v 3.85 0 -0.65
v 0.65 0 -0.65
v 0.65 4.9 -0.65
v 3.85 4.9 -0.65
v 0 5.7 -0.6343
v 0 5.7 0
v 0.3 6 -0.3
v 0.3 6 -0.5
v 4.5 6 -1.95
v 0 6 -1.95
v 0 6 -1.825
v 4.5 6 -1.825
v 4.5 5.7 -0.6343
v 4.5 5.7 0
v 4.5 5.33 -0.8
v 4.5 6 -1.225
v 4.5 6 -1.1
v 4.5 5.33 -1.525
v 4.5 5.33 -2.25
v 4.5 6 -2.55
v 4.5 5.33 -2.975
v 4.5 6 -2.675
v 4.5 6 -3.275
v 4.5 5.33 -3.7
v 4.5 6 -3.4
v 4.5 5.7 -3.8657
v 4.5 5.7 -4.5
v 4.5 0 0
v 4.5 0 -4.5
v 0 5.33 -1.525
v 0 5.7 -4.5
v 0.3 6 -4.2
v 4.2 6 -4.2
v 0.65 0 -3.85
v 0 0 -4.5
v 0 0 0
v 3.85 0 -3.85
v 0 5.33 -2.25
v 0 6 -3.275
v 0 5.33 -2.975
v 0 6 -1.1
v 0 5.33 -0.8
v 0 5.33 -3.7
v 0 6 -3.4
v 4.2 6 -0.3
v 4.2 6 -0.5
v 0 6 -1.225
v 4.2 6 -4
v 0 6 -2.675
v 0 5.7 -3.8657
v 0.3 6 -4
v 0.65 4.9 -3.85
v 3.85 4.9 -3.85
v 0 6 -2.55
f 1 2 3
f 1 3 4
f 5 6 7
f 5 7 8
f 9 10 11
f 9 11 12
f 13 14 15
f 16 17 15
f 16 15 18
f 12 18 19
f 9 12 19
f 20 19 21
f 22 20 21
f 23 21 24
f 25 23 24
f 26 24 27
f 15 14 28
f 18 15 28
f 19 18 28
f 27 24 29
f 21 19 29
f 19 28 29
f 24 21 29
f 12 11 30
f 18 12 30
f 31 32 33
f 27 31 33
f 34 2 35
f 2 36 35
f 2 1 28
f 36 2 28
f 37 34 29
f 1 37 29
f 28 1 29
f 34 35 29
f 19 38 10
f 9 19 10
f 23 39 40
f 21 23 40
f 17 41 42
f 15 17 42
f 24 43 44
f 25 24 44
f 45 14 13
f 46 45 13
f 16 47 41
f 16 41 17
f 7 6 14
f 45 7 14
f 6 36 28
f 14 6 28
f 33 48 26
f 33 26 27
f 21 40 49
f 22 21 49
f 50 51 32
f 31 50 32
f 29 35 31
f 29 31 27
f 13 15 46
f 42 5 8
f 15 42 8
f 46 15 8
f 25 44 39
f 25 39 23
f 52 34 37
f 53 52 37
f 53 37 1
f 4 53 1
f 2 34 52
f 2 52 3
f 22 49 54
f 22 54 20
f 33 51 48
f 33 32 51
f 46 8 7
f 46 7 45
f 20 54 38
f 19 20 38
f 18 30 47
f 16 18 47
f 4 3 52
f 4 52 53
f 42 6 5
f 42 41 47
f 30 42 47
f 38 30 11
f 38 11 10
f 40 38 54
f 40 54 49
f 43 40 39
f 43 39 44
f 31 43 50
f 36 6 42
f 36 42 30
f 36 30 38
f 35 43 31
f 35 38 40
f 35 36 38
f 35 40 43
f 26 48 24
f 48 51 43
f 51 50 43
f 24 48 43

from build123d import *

# Parameters (mm, degrees)
SKETCH1_W           = 4.5
SKETCH1_H           = 4.5
BOSS_EXTRUDE1_DEPTH = 6
SKETCH2_W           = 3.2
SKETCH2_H           = 3.2
CUT_EXTRUDE1_DEPTH  = 4.9
CUT_EXTRUDE2_DEPTH  = 4.5
LPATTERN1_COUNT     = 5
LPATTERN1_PITCH     = 0.725
CHAMFER1_SIZE       = 0.3


with BuildPart() as part:
    # Sketch1 → Boss-Extrude1 (new body)
    with BuildSketch(Plane(origin=(0, 0, 0), x_dir=(1, 0, 0), z_dir=(0, 1, 0))):
        with Locations((2.25, 2.25)):
            Rectangle(SKETCH1_W, SKETCH1_H)
    extrude(amount=BOSS_EXTRUDE1_DEPTH)

    # Sketch2 → Cut-Extrude1 (cut)
    with BuildSketch(Plane.XZ):
        with Locations((2.25, -2.25)):
            Rectangle(SKETCH2_W, SKETCH2_H)
    extrude(amount=-CUT_EXTRUDE1_DEPTH, mode=Mode.SUBTRACT)

    # Sketch3 → Cut-Extrude2 (cut)
    with BuildSketch(Plane.ZY):
        Polygon((-4, 6), (-3.7, 5.33), (-3.4, 6), align=None)
    cut_extrude2 = extrude(amount=-CUT_EXTRUDE2_DEPTH, mode=Mode.SUBTRACT)

    # LPattern1: Cut-Extrude2 ×5
    with Locations(*[(0, 0, i * LPATTERN1_PITCH) for i in range(1, LPATTERN1_COUNT)]):
        add(cut_extrude2, mode=Mode.SUBTRACT)

    # Chamfer1
    chamfer1_edges = [part.edges().sort_by_distance(p)[0] for p in [
        (4.5, 6, -0.25),
        (2.25, 6, -4.5),
        (4.5, 6, -4.25),
        (0, 6, -0.25),
        (0, 6, -4.25),
        (2.25, 6, 0),
    ]]
    chamfer(chamfer1_edges, length=CHAMFER1_SIZE)


solid = part.part
